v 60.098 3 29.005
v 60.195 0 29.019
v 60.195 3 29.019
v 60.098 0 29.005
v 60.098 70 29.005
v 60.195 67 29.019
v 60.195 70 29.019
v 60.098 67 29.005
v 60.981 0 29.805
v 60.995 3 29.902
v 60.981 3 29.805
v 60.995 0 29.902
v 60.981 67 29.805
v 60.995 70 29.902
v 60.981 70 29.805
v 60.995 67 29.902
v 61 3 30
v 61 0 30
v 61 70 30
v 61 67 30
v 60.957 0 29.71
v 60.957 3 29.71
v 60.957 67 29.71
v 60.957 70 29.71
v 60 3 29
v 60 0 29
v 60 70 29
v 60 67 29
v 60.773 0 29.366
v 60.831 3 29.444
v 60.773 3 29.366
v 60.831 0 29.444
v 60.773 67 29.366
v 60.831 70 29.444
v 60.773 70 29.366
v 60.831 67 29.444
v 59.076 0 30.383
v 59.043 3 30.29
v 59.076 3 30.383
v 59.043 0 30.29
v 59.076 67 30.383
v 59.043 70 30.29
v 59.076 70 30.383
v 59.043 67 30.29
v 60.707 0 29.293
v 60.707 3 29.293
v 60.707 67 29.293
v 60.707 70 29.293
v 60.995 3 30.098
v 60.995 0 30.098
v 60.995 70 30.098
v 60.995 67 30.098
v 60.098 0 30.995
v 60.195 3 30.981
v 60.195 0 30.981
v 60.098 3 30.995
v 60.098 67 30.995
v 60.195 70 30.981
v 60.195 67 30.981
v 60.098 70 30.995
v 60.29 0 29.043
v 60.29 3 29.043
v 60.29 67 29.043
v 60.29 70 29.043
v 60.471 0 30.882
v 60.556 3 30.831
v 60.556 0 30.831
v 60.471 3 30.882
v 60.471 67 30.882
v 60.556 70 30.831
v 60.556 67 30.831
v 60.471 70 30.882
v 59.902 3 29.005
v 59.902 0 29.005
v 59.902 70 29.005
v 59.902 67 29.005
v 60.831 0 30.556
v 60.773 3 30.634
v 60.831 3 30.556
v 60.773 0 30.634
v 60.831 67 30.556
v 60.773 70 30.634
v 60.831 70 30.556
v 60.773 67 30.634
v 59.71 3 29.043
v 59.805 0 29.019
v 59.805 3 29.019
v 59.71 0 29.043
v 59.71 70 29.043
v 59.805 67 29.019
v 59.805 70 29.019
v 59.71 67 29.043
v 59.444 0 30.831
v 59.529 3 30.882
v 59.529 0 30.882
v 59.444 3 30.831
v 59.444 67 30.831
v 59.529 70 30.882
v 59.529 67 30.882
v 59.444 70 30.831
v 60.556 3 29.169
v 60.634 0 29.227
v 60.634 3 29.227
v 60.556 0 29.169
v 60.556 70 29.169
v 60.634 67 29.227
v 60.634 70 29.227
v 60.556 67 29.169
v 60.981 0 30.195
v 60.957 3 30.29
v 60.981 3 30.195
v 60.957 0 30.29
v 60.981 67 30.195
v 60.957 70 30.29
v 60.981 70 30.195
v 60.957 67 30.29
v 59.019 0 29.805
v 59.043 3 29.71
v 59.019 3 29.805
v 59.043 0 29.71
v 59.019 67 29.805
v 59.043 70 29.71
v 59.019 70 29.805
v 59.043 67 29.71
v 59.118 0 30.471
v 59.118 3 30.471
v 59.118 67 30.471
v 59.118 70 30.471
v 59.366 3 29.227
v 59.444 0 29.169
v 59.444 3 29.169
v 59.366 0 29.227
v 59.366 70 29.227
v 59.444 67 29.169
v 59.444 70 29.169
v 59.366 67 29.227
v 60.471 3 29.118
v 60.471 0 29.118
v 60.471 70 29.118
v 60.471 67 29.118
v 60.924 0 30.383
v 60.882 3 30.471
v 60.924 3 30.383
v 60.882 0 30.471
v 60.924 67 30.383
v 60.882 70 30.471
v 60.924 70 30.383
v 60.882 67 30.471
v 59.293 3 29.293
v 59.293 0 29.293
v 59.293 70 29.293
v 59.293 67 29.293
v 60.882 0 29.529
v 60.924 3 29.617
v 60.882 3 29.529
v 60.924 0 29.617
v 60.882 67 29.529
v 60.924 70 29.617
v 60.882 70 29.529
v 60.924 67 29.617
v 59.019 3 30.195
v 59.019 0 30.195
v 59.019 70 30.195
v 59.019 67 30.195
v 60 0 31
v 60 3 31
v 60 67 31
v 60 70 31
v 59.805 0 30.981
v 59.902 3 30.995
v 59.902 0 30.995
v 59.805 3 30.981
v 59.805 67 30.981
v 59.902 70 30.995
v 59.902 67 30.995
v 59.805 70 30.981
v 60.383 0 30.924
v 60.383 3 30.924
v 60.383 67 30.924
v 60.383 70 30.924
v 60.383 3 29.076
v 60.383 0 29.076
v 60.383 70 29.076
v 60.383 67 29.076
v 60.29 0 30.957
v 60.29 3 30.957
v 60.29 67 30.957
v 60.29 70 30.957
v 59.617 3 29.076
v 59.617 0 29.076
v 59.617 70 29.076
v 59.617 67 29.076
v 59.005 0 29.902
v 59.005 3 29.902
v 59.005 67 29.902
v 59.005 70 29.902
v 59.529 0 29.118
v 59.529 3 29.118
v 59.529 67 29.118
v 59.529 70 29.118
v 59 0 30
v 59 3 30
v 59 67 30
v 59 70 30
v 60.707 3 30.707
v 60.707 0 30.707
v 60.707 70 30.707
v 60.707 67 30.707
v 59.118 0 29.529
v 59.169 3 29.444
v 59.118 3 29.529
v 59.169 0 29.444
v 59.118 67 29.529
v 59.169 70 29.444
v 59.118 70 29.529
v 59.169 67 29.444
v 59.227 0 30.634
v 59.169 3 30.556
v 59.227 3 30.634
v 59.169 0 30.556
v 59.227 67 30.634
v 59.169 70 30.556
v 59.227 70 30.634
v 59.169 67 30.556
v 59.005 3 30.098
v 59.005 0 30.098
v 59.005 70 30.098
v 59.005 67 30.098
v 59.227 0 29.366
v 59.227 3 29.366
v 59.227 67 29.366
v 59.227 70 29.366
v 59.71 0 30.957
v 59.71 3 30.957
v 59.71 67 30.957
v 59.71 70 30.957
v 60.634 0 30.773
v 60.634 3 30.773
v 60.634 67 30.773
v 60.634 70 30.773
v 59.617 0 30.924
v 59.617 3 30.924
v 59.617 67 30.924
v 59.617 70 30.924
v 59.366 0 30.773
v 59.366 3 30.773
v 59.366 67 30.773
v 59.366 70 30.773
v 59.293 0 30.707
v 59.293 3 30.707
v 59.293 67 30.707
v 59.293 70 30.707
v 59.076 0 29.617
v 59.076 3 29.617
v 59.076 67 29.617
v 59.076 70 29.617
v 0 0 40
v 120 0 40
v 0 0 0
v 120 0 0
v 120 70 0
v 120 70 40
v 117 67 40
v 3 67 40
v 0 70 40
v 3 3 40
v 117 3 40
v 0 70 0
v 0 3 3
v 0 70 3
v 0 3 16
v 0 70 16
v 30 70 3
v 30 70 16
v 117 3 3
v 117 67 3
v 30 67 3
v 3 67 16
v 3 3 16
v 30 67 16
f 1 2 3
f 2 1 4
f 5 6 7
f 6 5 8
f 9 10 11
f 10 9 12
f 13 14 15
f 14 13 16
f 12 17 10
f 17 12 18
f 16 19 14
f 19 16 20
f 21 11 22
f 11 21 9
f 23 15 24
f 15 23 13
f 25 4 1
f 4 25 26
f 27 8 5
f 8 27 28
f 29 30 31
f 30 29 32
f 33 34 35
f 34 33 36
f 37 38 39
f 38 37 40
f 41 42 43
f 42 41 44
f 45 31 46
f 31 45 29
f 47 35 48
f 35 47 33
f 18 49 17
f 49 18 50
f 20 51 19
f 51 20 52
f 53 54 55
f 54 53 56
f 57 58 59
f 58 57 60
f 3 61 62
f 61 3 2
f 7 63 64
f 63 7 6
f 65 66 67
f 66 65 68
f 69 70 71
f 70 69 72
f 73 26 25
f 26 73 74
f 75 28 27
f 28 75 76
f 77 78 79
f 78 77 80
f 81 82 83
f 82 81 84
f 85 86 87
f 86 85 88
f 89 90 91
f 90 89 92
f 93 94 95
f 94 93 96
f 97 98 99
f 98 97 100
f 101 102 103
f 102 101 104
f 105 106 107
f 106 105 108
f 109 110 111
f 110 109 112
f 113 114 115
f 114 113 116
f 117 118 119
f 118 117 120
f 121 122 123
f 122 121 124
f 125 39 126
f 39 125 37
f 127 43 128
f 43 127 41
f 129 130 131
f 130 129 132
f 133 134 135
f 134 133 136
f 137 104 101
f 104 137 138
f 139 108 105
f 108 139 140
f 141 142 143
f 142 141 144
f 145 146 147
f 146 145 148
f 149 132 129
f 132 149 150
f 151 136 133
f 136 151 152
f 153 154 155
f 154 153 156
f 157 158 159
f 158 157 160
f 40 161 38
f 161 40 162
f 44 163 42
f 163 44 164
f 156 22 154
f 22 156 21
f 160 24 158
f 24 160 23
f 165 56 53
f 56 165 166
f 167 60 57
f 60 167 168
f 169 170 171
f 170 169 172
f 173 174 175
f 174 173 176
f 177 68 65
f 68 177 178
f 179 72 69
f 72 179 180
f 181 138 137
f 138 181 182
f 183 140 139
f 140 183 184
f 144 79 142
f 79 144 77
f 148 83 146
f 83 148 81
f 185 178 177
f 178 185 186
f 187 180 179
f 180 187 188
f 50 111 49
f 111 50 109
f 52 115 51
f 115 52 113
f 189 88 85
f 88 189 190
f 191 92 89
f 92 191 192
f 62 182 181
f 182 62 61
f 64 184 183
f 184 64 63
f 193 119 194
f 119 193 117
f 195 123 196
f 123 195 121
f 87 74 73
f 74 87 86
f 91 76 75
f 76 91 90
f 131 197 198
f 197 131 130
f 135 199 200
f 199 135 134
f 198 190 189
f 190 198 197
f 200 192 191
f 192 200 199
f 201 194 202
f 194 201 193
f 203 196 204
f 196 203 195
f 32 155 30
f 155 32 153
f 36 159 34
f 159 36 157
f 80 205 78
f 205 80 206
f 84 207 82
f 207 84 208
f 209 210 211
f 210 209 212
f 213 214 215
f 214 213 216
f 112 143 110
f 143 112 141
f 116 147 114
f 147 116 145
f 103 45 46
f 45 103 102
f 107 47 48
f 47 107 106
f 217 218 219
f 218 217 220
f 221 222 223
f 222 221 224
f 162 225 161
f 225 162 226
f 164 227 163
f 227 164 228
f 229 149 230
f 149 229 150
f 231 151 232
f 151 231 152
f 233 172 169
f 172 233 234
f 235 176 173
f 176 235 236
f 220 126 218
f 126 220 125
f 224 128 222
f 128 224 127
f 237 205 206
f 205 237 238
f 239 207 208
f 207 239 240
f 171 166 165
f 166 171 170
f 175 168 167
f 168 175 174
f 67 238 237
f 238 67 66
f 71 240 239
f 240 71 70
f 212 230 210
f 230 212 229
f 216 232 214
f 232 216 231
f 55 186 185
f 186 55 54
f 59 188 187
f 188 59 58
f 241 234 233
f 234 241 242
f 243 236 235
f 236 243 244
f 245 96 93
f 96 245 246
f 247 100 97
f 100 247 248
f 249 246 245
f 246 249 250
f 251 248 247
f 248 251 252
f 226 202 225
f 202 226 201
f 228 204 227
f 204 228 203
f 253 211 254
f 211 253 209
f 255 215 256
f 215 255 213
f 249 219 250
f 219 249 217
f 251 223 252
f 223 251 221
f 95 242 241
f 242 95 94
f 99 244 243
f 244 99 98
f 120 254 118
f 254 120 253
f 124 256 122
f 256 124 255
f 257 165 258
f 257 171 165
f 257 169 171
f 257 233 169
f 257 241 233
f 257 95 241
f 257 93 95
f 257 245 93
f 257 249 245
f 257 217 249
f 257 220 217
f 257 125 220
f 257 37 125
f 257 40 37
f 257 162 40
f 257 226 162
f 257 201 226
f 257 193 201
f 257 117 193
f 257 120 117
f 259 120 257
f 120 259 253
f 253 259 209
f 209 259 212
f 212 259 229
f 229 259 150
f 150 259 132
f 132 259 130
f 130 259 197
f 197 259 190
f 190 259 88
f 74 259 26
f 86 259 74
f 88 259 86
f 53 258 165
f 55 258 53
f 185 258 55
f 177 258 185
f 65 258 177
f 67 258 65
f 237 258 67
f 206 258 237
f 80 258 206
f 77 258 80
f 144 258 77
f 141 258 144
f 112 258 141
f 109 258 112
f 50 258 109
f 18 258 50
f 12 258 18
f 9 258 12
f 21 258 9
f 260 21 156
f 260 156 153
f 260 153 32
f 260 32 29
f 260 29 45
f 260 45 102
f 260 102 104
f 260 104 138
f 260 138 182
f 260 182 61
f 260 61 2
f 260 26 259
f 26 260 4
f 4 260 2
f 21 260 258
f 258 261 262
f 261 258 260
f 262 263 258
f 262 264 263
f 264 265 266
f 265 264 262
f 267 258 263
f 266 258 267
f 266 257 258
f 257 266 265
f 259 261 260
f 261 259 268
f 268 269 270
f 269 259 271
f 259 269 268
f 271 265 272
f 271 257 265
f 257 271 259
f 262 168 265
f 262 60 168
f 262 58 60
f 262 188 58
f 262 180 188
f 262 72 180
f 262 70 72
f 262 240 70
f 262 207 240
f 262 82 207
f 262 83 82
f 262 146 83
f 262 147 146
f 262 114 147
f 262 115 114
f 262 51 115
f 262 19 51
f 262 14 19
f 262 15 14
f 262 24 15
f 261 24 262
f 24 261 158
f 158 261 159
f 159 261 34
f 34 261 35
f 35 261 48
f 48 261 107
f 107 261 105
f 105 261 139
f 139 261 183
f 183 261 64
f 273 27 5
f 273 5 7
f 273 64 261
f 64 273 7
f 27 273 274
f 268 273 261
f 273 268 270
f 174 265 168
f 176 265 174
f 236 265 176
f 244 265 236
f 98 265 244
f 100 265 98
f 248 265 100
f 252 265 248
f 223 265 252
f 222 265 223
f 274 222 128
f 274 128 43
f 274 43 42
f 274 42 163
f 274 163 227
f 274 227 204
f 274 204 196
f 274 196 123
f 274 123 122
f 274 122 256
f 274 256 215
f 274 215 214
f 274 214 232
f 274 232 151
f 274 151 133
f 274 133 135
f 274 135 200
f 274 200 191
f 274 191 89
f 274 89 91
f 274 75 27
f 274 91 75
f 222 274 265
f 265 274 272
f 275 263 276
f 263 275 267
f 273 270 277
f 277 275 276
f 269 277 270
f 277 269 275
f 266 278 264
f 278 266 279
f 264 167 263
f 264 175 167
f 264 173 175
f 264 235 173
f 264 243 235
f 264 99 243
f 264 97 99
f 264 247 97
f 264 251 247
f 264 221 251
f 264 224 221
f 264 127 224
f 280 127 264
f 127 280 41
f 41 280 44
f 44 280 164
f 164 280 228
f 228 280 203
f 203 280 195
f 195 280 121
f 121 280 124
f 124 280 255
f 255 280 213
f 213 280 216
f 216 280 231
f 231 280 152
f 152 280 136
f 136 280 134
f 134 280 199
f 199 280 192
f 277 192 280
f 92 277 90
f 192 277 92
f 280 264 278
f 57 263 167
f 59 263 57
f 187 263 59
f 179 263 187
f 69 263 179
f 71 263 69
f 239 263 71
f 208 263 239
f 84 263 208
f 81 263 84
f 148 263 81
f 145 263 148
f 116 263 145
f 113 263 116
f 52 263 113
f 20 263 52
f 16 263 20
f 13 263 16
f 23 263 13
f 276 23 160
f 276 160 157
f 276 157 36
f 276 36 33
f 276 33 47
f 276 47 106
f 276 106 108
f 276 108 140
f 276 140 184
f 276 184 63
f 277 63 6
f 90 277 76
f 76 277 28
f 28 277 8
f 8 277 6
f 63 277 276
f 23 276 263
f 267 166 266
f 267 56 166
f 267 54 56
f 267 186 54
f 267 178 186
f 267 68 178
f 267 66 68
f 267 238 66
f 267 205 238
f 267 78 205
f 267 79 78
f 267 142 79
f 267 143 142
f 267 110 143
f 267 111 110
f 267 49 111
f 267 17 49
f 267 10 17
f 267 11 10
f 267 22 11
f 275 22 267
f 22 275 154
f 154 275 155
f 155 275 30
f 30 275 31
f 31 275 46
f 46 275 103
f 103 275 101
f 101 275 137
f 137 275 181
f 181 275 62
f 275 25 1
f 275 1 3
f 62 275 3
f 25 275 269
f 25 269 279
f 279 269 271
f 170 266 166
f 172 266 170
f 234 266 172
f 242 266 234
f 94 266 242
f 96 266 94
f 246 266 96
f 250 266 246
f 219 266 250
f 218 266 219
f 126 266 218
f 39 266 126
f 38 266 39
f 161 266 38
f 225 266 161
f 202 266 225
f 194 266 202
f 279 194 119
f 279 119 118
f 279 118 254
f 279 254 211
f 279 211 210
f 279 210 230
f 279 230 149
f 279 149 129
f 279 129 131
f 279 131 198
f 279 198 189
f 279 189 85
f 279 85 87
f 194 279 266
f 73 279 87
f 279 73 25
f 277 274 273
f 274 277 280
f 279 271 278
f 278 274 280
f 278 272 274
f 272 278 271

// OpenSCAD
// Buffer tank for mini horizontal gel electrophoresis
// Print orientation: open top up, resting on XY plane at z = 0

$fn = 64;

// ---- Tank ----
outer_x = 120;   // tank outer length (X)
outer_y = 70;    // tank outer width (Y)
tank_h  = 40;    // tank outer height (Z)
wall    = 3;     // wall thickness
floor   = 3;     // floor thickness

// ---- Platform ----
plat_x = 60;     // platform length in X (centred)
plat_y = outer_y; // platform spans full inner width
plat_top = 13;   // platform top height above inner floor (z = 13)

// ---- Electrode holes ----
hole_d = 2;      // electrode hole diameter
hole_y = 0;      // electrode hole Y position
hole_z = 30;     // electrode hole Z position

// ---- Misc ----
eps = 0.5;       // cutter overshoot past faces

difference() {
    // Main tank body
    cube([outer_x, outer_y, tank_h]);

    // Inner cavity, from top of floor to just below tank top
    translate([wall, wall, floor])
        cube([outer_x - 2*wall, outer_y - 2*wall, tank_h - floor]);

    // Raised platform in the middle
    translate([-plat_x/2, wall, floor])
        cube([plat_x, plat_y, plat_top]);

    // Horizontal electrode holes through each end wall, along X
    for (x = [-outer_x/2, outer_x/2])
        translate([x, hole_y, hole_z])
            rotate([-90, 0, 0])
                cylinder(d = hole_d, h = outer_x + 2*eps);
}
